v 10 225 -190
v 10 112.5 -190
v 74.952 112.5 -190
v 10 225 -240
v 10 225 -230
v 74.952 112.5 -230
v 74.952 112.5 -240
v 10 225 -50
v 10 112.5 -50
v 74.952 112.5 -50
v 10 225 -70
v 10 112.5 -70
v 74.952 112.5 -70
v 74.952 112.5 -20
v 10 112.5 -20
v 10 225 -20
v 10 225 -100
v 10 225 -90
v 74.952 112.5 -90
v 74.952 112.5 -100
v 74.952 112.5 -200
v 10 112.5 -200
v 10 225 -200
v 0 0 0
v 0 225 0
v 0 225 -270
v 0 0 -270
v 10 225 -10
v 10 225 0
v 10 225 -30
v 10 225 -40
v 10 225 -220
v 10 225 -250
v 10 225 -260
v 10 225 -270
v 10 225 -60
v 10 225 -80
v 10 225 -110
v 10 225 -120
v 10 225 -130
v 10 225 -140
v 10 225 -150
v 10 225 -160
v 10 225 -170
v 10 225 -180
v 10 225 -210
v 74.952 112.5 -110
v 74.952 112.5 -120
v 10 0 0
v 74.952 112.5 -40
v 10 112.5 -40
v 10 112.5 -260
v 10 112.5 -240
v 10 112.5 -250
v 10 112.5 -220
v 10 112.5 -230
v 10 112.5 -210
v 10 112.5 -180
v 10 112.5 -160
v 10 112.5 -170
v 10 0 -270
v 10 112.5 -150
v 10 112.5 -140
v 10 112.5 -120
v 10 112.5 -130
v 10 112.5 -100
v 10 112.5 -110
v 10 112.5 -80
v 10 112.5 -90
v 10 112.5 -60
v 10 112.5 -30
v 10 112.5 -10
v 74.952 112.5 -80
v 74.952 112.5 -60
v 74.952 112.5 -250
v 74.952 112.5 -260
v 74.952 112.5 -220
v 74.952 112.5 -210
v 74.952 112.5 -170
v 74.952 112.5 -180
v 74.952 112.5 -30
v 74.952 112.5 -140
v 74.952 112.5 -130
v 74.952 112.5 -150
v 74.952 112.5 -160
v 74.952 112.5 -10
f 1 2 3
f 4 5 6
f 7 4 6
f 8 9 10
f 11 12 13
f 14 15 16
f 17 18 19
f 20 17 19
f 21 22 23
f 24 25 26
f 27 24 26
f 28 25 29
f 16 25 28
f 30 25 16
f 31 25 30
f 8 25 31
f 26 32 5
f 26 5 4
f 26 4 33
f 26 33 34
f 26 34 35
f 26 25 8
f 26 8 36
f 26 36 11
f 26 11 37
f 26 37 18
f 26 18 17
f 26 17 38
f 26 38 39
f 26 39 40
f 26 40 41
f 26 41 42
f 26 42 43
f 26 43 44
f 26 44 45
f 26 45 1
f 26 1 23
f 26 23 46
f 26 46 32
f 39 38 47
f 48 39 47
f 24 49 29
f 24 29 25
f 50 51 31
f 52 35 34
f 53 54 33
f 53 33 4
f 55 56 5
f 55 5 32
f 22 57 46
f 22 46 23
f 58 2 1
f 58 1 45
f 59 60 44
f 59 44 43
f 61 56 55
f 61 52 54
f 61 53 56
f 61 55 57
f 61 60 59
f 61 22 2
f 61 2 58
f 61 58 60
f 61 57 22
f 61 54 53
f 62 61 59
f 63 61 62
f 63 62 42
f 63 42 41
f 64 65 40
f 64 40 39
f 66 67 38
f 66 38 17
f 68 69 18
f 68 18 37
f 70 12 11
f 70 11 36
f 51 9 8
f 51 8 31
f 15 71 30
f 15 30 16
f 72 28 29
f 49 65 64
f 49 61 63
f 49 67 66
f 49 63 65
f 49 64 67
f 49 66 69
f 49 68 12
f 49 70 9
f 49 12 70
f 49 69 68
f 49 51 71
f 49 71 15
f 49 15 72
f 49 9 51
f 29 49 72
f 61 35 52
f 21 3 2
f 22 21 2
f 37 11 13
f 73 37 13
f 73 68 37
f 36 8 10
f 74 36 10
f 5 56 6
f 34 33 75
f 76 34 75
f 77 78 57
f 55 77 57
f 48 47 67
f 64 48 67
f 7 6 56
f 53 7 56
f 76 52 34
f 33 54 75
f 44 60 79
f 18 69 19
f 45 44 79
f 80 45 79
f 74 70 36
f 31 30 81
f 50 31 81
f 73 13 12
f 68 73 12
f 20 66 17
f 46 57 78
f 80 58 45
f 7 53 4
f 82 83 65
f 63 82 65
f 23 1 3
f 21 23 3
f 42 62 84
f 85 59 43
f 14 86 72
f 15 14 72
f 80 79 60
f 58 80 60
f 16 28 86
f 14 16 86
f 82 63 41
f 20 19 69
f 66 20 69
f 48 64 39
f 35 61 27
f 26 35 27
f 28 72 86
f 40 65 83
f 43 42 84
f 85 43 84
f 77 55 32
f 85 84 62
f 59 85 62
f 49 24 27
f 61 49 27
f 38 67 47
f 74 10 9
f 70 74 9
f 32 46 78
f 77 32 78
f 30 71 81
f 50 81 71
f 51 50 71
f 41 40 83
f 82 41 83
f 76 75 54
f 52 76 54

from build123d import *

# Parameters (mm, degrees)
SKETCH2_W           = 270
SKETCH2_H           = 225
BOSS_EXTRUDE1_DEPTH = 10
BOSS_EXTRUDE4_DEPTH = 270
SKETCH5_W           = 64.951905284
SKETCH5_H           = 10
CUT_EXTRUDE1_DEPTH  = 302.95039014
SKETCH6_W           = 64.951905284
SKETCH6_H           = 10
CUT_EXTRUDE2_DEPTH  = 302.95039014
SKETCH7_W           = 64.951905284
SKETCH7_H           = 10
CUT_EXTRUDE3_DEPTH  = 302.95039014


with BuildPart() as part:
    # Sketch2 → Boss-Extrude1 (new body)
    with BuildSketch(Plane(origin=(0, 0, 0), x_dir=(0, 0, -1), z_dir=(1, 0, 0))):
        with Locations((135, 112.5)):
            Rectangle(SKETCH2_W, SKETCH2_H)
    extrude(amount=BOSS_EXTRUDE1_DEPTH)

    # Sketch4 → Boss-Extrude4 (add)
    with BuildSketch(Plane.XY):
        Polygon((10, 225), (74.951905284, 112.5), (10, 112.5), align=None)
    extrude(amount=-BOSS_EXTRUDE4_DEPTH)

    # Sketch5 → Cut-Extrude1 (cut, through all)
    with BuildSketch(Plane.XZ.offset(-112.5)):
        with Locations((42.475952642, -265)):
            Rectangle(SKETCH5_W, SKETCH5_H)
    extrude(amount=-CUT_EXTRUDE1_DEPTH, mode=Mode.SUBTRACT)

    # Sketch6 → Cut-Extrude2 (cut, through all)
    with BuildSketch(Plane.XZ.offset(-112.5)):
        with Locations((42.475952642, -245)):
            Rectangle(SKETCH6_W, SKETCH6_H)
    extrude(amount=-CUT_EXTRUDE2_DEPTH, mode=Mode.SUBTRACT)

    # Sketch7 → Cut-Extrude3 (cut, through all)
    with BuildSketch(Plane.XZ.offset(-112.5)):
        with Locations((42.475952642, -5)):
            Rectangle(SKETCH7_W, SKETCH7_H)
        with Locations((42.475952642, -25)):
            Rectangle(SKETCH7_W, SKETCH7_H)
        with Locations((42.475952642, -45)):
            Rectangle(SKETCH7_W, SKETCH7_H)
        with Locations((42.475952642, -65)):
            Rectangle(SKETCH7_W, SKETCH7_H)
        with Locations((42.475952642, -85)):
            Rectangle(SKETCH7_W, SKETCH7_H)
        with Locations((42.475952642, -105)):
            Rectangle(SKETCH7_W, SKETCH7_H)
        with Locations((42.475952642, -125)):
            Rectangle(SKETCH7_W, SKETCH7_H)
        with Locations((42.475952642, -145)):
            Rectangle(SKETCH7_W, SKETCH7_H)
        with Locations((42.475952642, -165)):
            Rectangle(SKETCH7_W, SKETCH7_H)
        with Locations((42.475952642, -185)):
            Rectangle(SKETCH7_W, SKETCH7_H)
        with Locations((42.475952642, -205)):
            Rectangle(SKETCH7_W, SKETCH7_H)
        with Locations((42.475952642, -225)):
            Rectangle(SKETCH7_W, SKETCH7_H)
    extrude(amount=-CUT_EXTRUDE3_DEPTH, mode=Mode.SUBTRACT)


solid = part.part
